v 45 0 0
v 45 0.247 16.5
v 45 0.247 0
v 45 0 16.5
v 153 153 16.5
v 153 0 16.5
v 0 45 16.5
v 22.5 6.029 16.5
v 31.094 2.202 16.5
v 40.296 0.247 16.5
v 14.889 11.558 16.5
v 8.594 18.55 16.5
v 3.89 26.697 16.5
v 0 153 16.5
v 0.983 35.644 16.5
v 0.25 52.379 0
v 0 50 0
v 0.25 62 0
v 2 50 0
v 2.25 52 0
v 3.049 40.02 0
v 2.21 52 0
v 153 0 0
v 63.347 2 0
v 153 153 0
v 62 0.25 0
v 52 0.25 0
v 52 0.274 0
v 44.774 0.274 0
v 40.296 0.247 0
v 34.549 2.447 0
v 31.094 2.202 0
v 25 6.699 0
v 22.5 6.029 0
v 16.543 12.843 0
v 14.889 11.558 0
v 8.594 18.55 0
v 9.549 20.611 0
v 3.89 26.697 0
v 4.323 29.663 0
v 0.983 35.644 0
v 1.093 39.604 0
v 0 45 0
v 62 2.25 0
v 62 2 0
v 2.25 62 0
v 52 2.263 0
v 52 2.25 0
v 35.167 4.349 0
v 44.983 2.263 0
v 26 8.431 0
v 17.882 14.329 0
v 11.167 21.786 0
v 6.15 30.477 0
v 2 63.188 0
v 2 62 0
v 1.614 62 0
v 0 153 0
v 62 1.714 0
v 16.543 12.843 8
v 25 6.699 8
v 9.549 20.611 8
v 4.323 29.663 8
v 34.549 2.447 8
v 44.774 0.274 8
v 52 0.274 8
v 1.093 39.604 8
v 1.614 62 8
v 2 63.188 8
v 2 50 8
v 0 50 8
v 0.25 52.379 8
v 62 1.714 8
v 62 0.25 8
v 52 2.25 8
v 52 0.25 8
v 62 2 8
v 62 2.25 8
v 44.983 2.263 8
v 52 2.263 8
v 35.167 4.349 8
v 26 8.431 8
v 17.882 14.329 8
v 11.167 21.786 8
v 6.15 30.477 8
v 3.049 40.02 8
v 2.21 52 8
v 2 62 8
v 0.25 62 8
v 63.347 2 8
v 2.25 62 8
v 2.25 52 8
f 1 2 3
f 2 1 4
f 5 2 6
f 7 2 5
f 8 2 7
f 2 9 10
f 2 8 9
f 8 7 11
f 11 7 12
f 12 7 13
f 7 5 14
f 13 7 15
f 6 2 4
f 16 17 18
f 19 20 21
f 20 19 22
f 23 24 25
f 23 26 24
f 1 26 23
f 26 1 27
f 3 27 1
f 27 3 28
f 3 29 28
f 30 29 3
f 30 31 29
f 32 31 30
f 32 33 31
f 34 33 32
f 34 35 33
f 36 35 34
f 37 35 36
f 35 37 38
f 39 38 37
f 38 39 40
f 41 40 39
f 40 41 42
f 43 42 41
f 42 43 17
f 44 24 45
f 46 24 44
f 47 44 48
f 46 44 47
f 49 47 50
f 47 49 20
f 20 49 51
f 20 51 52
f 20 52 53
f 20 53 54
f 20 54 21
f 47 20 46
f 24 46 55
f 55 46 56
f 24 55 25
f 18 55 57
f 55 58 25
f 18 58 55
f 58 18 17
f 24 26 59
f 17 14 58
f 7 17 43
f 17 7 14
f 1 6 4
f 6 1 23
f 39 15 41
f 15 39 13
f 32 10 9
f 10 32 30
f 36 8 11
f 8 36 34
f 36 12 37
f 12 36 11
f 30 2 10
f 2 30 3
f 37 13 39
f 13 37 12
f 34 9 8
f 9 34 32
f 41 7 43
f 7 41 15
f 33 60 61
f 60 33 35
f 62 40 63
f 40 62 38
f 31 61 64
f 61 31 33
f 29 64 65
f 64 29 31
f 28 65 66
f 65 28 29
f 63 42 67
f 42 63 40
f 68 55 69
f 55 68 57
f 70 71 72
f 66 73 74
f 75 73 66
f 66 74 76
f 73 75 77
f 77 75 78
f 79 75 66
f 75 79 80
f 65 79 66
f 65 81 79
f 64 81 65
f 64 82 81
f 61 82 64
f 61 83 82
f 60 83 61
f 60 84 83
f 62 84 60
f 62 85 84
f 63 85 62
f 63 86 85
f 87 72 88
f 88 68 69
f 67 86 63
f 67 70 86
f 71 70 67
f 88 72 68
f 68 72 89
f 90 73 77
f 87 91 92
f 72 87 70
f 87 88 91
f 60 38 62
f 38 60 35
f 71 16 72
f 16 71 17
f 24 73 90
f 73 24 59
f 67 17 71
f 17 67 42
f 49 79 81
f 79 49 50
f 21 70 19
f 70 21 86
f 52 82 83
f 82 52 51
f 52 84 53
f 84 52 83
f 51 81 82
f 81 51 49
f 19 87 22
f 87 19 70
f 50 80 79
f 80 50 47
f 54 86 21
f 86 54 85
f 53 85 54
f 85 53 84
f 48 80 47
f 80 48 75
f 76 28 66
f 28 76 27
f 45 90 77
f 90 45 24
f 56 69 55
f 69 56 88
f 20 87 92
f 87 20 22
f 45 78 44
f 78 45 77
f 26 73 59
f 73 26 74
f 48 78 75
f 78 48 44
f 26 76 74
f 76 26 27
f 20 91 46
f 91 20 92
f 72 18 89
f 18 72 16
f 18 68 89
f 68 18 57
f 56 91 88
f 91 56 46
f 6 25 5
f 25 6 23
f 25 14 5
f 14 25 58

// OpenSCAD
difference() {
    // Starting geometry, solid cube.
    cube([153, 153, 16.5]);

    // subtract the outer curve
    difference () {
        cube([45, 45, 16.5]);
        translate([45, 45, 0])
            cylinder(16.6, r = 45);
    }
    
    // Subtract the inside of the outer curve.
    translate([2, 2, 0])
    
    union() {
        difference () {
            translate([48, 48, 0])
                scale([1/10, 1/10, 1/10])
                cylinder(80, r = 500);
            translate([48,48, 0])
                scale([1/10, 1/10, 1/10])
                cylinder(80, r = 480);
            translate([50, 0, 0])
                cube([50, 100, 8]);
            translate([0, 50, 0])
                cube([100, 50, 8]);
        };
        translate([50, -1.75, 0])
            cube([10, 2, 8]);
        translate([-1.75, 50, 0])
            cube([2, 10, 8]);
    }
}
